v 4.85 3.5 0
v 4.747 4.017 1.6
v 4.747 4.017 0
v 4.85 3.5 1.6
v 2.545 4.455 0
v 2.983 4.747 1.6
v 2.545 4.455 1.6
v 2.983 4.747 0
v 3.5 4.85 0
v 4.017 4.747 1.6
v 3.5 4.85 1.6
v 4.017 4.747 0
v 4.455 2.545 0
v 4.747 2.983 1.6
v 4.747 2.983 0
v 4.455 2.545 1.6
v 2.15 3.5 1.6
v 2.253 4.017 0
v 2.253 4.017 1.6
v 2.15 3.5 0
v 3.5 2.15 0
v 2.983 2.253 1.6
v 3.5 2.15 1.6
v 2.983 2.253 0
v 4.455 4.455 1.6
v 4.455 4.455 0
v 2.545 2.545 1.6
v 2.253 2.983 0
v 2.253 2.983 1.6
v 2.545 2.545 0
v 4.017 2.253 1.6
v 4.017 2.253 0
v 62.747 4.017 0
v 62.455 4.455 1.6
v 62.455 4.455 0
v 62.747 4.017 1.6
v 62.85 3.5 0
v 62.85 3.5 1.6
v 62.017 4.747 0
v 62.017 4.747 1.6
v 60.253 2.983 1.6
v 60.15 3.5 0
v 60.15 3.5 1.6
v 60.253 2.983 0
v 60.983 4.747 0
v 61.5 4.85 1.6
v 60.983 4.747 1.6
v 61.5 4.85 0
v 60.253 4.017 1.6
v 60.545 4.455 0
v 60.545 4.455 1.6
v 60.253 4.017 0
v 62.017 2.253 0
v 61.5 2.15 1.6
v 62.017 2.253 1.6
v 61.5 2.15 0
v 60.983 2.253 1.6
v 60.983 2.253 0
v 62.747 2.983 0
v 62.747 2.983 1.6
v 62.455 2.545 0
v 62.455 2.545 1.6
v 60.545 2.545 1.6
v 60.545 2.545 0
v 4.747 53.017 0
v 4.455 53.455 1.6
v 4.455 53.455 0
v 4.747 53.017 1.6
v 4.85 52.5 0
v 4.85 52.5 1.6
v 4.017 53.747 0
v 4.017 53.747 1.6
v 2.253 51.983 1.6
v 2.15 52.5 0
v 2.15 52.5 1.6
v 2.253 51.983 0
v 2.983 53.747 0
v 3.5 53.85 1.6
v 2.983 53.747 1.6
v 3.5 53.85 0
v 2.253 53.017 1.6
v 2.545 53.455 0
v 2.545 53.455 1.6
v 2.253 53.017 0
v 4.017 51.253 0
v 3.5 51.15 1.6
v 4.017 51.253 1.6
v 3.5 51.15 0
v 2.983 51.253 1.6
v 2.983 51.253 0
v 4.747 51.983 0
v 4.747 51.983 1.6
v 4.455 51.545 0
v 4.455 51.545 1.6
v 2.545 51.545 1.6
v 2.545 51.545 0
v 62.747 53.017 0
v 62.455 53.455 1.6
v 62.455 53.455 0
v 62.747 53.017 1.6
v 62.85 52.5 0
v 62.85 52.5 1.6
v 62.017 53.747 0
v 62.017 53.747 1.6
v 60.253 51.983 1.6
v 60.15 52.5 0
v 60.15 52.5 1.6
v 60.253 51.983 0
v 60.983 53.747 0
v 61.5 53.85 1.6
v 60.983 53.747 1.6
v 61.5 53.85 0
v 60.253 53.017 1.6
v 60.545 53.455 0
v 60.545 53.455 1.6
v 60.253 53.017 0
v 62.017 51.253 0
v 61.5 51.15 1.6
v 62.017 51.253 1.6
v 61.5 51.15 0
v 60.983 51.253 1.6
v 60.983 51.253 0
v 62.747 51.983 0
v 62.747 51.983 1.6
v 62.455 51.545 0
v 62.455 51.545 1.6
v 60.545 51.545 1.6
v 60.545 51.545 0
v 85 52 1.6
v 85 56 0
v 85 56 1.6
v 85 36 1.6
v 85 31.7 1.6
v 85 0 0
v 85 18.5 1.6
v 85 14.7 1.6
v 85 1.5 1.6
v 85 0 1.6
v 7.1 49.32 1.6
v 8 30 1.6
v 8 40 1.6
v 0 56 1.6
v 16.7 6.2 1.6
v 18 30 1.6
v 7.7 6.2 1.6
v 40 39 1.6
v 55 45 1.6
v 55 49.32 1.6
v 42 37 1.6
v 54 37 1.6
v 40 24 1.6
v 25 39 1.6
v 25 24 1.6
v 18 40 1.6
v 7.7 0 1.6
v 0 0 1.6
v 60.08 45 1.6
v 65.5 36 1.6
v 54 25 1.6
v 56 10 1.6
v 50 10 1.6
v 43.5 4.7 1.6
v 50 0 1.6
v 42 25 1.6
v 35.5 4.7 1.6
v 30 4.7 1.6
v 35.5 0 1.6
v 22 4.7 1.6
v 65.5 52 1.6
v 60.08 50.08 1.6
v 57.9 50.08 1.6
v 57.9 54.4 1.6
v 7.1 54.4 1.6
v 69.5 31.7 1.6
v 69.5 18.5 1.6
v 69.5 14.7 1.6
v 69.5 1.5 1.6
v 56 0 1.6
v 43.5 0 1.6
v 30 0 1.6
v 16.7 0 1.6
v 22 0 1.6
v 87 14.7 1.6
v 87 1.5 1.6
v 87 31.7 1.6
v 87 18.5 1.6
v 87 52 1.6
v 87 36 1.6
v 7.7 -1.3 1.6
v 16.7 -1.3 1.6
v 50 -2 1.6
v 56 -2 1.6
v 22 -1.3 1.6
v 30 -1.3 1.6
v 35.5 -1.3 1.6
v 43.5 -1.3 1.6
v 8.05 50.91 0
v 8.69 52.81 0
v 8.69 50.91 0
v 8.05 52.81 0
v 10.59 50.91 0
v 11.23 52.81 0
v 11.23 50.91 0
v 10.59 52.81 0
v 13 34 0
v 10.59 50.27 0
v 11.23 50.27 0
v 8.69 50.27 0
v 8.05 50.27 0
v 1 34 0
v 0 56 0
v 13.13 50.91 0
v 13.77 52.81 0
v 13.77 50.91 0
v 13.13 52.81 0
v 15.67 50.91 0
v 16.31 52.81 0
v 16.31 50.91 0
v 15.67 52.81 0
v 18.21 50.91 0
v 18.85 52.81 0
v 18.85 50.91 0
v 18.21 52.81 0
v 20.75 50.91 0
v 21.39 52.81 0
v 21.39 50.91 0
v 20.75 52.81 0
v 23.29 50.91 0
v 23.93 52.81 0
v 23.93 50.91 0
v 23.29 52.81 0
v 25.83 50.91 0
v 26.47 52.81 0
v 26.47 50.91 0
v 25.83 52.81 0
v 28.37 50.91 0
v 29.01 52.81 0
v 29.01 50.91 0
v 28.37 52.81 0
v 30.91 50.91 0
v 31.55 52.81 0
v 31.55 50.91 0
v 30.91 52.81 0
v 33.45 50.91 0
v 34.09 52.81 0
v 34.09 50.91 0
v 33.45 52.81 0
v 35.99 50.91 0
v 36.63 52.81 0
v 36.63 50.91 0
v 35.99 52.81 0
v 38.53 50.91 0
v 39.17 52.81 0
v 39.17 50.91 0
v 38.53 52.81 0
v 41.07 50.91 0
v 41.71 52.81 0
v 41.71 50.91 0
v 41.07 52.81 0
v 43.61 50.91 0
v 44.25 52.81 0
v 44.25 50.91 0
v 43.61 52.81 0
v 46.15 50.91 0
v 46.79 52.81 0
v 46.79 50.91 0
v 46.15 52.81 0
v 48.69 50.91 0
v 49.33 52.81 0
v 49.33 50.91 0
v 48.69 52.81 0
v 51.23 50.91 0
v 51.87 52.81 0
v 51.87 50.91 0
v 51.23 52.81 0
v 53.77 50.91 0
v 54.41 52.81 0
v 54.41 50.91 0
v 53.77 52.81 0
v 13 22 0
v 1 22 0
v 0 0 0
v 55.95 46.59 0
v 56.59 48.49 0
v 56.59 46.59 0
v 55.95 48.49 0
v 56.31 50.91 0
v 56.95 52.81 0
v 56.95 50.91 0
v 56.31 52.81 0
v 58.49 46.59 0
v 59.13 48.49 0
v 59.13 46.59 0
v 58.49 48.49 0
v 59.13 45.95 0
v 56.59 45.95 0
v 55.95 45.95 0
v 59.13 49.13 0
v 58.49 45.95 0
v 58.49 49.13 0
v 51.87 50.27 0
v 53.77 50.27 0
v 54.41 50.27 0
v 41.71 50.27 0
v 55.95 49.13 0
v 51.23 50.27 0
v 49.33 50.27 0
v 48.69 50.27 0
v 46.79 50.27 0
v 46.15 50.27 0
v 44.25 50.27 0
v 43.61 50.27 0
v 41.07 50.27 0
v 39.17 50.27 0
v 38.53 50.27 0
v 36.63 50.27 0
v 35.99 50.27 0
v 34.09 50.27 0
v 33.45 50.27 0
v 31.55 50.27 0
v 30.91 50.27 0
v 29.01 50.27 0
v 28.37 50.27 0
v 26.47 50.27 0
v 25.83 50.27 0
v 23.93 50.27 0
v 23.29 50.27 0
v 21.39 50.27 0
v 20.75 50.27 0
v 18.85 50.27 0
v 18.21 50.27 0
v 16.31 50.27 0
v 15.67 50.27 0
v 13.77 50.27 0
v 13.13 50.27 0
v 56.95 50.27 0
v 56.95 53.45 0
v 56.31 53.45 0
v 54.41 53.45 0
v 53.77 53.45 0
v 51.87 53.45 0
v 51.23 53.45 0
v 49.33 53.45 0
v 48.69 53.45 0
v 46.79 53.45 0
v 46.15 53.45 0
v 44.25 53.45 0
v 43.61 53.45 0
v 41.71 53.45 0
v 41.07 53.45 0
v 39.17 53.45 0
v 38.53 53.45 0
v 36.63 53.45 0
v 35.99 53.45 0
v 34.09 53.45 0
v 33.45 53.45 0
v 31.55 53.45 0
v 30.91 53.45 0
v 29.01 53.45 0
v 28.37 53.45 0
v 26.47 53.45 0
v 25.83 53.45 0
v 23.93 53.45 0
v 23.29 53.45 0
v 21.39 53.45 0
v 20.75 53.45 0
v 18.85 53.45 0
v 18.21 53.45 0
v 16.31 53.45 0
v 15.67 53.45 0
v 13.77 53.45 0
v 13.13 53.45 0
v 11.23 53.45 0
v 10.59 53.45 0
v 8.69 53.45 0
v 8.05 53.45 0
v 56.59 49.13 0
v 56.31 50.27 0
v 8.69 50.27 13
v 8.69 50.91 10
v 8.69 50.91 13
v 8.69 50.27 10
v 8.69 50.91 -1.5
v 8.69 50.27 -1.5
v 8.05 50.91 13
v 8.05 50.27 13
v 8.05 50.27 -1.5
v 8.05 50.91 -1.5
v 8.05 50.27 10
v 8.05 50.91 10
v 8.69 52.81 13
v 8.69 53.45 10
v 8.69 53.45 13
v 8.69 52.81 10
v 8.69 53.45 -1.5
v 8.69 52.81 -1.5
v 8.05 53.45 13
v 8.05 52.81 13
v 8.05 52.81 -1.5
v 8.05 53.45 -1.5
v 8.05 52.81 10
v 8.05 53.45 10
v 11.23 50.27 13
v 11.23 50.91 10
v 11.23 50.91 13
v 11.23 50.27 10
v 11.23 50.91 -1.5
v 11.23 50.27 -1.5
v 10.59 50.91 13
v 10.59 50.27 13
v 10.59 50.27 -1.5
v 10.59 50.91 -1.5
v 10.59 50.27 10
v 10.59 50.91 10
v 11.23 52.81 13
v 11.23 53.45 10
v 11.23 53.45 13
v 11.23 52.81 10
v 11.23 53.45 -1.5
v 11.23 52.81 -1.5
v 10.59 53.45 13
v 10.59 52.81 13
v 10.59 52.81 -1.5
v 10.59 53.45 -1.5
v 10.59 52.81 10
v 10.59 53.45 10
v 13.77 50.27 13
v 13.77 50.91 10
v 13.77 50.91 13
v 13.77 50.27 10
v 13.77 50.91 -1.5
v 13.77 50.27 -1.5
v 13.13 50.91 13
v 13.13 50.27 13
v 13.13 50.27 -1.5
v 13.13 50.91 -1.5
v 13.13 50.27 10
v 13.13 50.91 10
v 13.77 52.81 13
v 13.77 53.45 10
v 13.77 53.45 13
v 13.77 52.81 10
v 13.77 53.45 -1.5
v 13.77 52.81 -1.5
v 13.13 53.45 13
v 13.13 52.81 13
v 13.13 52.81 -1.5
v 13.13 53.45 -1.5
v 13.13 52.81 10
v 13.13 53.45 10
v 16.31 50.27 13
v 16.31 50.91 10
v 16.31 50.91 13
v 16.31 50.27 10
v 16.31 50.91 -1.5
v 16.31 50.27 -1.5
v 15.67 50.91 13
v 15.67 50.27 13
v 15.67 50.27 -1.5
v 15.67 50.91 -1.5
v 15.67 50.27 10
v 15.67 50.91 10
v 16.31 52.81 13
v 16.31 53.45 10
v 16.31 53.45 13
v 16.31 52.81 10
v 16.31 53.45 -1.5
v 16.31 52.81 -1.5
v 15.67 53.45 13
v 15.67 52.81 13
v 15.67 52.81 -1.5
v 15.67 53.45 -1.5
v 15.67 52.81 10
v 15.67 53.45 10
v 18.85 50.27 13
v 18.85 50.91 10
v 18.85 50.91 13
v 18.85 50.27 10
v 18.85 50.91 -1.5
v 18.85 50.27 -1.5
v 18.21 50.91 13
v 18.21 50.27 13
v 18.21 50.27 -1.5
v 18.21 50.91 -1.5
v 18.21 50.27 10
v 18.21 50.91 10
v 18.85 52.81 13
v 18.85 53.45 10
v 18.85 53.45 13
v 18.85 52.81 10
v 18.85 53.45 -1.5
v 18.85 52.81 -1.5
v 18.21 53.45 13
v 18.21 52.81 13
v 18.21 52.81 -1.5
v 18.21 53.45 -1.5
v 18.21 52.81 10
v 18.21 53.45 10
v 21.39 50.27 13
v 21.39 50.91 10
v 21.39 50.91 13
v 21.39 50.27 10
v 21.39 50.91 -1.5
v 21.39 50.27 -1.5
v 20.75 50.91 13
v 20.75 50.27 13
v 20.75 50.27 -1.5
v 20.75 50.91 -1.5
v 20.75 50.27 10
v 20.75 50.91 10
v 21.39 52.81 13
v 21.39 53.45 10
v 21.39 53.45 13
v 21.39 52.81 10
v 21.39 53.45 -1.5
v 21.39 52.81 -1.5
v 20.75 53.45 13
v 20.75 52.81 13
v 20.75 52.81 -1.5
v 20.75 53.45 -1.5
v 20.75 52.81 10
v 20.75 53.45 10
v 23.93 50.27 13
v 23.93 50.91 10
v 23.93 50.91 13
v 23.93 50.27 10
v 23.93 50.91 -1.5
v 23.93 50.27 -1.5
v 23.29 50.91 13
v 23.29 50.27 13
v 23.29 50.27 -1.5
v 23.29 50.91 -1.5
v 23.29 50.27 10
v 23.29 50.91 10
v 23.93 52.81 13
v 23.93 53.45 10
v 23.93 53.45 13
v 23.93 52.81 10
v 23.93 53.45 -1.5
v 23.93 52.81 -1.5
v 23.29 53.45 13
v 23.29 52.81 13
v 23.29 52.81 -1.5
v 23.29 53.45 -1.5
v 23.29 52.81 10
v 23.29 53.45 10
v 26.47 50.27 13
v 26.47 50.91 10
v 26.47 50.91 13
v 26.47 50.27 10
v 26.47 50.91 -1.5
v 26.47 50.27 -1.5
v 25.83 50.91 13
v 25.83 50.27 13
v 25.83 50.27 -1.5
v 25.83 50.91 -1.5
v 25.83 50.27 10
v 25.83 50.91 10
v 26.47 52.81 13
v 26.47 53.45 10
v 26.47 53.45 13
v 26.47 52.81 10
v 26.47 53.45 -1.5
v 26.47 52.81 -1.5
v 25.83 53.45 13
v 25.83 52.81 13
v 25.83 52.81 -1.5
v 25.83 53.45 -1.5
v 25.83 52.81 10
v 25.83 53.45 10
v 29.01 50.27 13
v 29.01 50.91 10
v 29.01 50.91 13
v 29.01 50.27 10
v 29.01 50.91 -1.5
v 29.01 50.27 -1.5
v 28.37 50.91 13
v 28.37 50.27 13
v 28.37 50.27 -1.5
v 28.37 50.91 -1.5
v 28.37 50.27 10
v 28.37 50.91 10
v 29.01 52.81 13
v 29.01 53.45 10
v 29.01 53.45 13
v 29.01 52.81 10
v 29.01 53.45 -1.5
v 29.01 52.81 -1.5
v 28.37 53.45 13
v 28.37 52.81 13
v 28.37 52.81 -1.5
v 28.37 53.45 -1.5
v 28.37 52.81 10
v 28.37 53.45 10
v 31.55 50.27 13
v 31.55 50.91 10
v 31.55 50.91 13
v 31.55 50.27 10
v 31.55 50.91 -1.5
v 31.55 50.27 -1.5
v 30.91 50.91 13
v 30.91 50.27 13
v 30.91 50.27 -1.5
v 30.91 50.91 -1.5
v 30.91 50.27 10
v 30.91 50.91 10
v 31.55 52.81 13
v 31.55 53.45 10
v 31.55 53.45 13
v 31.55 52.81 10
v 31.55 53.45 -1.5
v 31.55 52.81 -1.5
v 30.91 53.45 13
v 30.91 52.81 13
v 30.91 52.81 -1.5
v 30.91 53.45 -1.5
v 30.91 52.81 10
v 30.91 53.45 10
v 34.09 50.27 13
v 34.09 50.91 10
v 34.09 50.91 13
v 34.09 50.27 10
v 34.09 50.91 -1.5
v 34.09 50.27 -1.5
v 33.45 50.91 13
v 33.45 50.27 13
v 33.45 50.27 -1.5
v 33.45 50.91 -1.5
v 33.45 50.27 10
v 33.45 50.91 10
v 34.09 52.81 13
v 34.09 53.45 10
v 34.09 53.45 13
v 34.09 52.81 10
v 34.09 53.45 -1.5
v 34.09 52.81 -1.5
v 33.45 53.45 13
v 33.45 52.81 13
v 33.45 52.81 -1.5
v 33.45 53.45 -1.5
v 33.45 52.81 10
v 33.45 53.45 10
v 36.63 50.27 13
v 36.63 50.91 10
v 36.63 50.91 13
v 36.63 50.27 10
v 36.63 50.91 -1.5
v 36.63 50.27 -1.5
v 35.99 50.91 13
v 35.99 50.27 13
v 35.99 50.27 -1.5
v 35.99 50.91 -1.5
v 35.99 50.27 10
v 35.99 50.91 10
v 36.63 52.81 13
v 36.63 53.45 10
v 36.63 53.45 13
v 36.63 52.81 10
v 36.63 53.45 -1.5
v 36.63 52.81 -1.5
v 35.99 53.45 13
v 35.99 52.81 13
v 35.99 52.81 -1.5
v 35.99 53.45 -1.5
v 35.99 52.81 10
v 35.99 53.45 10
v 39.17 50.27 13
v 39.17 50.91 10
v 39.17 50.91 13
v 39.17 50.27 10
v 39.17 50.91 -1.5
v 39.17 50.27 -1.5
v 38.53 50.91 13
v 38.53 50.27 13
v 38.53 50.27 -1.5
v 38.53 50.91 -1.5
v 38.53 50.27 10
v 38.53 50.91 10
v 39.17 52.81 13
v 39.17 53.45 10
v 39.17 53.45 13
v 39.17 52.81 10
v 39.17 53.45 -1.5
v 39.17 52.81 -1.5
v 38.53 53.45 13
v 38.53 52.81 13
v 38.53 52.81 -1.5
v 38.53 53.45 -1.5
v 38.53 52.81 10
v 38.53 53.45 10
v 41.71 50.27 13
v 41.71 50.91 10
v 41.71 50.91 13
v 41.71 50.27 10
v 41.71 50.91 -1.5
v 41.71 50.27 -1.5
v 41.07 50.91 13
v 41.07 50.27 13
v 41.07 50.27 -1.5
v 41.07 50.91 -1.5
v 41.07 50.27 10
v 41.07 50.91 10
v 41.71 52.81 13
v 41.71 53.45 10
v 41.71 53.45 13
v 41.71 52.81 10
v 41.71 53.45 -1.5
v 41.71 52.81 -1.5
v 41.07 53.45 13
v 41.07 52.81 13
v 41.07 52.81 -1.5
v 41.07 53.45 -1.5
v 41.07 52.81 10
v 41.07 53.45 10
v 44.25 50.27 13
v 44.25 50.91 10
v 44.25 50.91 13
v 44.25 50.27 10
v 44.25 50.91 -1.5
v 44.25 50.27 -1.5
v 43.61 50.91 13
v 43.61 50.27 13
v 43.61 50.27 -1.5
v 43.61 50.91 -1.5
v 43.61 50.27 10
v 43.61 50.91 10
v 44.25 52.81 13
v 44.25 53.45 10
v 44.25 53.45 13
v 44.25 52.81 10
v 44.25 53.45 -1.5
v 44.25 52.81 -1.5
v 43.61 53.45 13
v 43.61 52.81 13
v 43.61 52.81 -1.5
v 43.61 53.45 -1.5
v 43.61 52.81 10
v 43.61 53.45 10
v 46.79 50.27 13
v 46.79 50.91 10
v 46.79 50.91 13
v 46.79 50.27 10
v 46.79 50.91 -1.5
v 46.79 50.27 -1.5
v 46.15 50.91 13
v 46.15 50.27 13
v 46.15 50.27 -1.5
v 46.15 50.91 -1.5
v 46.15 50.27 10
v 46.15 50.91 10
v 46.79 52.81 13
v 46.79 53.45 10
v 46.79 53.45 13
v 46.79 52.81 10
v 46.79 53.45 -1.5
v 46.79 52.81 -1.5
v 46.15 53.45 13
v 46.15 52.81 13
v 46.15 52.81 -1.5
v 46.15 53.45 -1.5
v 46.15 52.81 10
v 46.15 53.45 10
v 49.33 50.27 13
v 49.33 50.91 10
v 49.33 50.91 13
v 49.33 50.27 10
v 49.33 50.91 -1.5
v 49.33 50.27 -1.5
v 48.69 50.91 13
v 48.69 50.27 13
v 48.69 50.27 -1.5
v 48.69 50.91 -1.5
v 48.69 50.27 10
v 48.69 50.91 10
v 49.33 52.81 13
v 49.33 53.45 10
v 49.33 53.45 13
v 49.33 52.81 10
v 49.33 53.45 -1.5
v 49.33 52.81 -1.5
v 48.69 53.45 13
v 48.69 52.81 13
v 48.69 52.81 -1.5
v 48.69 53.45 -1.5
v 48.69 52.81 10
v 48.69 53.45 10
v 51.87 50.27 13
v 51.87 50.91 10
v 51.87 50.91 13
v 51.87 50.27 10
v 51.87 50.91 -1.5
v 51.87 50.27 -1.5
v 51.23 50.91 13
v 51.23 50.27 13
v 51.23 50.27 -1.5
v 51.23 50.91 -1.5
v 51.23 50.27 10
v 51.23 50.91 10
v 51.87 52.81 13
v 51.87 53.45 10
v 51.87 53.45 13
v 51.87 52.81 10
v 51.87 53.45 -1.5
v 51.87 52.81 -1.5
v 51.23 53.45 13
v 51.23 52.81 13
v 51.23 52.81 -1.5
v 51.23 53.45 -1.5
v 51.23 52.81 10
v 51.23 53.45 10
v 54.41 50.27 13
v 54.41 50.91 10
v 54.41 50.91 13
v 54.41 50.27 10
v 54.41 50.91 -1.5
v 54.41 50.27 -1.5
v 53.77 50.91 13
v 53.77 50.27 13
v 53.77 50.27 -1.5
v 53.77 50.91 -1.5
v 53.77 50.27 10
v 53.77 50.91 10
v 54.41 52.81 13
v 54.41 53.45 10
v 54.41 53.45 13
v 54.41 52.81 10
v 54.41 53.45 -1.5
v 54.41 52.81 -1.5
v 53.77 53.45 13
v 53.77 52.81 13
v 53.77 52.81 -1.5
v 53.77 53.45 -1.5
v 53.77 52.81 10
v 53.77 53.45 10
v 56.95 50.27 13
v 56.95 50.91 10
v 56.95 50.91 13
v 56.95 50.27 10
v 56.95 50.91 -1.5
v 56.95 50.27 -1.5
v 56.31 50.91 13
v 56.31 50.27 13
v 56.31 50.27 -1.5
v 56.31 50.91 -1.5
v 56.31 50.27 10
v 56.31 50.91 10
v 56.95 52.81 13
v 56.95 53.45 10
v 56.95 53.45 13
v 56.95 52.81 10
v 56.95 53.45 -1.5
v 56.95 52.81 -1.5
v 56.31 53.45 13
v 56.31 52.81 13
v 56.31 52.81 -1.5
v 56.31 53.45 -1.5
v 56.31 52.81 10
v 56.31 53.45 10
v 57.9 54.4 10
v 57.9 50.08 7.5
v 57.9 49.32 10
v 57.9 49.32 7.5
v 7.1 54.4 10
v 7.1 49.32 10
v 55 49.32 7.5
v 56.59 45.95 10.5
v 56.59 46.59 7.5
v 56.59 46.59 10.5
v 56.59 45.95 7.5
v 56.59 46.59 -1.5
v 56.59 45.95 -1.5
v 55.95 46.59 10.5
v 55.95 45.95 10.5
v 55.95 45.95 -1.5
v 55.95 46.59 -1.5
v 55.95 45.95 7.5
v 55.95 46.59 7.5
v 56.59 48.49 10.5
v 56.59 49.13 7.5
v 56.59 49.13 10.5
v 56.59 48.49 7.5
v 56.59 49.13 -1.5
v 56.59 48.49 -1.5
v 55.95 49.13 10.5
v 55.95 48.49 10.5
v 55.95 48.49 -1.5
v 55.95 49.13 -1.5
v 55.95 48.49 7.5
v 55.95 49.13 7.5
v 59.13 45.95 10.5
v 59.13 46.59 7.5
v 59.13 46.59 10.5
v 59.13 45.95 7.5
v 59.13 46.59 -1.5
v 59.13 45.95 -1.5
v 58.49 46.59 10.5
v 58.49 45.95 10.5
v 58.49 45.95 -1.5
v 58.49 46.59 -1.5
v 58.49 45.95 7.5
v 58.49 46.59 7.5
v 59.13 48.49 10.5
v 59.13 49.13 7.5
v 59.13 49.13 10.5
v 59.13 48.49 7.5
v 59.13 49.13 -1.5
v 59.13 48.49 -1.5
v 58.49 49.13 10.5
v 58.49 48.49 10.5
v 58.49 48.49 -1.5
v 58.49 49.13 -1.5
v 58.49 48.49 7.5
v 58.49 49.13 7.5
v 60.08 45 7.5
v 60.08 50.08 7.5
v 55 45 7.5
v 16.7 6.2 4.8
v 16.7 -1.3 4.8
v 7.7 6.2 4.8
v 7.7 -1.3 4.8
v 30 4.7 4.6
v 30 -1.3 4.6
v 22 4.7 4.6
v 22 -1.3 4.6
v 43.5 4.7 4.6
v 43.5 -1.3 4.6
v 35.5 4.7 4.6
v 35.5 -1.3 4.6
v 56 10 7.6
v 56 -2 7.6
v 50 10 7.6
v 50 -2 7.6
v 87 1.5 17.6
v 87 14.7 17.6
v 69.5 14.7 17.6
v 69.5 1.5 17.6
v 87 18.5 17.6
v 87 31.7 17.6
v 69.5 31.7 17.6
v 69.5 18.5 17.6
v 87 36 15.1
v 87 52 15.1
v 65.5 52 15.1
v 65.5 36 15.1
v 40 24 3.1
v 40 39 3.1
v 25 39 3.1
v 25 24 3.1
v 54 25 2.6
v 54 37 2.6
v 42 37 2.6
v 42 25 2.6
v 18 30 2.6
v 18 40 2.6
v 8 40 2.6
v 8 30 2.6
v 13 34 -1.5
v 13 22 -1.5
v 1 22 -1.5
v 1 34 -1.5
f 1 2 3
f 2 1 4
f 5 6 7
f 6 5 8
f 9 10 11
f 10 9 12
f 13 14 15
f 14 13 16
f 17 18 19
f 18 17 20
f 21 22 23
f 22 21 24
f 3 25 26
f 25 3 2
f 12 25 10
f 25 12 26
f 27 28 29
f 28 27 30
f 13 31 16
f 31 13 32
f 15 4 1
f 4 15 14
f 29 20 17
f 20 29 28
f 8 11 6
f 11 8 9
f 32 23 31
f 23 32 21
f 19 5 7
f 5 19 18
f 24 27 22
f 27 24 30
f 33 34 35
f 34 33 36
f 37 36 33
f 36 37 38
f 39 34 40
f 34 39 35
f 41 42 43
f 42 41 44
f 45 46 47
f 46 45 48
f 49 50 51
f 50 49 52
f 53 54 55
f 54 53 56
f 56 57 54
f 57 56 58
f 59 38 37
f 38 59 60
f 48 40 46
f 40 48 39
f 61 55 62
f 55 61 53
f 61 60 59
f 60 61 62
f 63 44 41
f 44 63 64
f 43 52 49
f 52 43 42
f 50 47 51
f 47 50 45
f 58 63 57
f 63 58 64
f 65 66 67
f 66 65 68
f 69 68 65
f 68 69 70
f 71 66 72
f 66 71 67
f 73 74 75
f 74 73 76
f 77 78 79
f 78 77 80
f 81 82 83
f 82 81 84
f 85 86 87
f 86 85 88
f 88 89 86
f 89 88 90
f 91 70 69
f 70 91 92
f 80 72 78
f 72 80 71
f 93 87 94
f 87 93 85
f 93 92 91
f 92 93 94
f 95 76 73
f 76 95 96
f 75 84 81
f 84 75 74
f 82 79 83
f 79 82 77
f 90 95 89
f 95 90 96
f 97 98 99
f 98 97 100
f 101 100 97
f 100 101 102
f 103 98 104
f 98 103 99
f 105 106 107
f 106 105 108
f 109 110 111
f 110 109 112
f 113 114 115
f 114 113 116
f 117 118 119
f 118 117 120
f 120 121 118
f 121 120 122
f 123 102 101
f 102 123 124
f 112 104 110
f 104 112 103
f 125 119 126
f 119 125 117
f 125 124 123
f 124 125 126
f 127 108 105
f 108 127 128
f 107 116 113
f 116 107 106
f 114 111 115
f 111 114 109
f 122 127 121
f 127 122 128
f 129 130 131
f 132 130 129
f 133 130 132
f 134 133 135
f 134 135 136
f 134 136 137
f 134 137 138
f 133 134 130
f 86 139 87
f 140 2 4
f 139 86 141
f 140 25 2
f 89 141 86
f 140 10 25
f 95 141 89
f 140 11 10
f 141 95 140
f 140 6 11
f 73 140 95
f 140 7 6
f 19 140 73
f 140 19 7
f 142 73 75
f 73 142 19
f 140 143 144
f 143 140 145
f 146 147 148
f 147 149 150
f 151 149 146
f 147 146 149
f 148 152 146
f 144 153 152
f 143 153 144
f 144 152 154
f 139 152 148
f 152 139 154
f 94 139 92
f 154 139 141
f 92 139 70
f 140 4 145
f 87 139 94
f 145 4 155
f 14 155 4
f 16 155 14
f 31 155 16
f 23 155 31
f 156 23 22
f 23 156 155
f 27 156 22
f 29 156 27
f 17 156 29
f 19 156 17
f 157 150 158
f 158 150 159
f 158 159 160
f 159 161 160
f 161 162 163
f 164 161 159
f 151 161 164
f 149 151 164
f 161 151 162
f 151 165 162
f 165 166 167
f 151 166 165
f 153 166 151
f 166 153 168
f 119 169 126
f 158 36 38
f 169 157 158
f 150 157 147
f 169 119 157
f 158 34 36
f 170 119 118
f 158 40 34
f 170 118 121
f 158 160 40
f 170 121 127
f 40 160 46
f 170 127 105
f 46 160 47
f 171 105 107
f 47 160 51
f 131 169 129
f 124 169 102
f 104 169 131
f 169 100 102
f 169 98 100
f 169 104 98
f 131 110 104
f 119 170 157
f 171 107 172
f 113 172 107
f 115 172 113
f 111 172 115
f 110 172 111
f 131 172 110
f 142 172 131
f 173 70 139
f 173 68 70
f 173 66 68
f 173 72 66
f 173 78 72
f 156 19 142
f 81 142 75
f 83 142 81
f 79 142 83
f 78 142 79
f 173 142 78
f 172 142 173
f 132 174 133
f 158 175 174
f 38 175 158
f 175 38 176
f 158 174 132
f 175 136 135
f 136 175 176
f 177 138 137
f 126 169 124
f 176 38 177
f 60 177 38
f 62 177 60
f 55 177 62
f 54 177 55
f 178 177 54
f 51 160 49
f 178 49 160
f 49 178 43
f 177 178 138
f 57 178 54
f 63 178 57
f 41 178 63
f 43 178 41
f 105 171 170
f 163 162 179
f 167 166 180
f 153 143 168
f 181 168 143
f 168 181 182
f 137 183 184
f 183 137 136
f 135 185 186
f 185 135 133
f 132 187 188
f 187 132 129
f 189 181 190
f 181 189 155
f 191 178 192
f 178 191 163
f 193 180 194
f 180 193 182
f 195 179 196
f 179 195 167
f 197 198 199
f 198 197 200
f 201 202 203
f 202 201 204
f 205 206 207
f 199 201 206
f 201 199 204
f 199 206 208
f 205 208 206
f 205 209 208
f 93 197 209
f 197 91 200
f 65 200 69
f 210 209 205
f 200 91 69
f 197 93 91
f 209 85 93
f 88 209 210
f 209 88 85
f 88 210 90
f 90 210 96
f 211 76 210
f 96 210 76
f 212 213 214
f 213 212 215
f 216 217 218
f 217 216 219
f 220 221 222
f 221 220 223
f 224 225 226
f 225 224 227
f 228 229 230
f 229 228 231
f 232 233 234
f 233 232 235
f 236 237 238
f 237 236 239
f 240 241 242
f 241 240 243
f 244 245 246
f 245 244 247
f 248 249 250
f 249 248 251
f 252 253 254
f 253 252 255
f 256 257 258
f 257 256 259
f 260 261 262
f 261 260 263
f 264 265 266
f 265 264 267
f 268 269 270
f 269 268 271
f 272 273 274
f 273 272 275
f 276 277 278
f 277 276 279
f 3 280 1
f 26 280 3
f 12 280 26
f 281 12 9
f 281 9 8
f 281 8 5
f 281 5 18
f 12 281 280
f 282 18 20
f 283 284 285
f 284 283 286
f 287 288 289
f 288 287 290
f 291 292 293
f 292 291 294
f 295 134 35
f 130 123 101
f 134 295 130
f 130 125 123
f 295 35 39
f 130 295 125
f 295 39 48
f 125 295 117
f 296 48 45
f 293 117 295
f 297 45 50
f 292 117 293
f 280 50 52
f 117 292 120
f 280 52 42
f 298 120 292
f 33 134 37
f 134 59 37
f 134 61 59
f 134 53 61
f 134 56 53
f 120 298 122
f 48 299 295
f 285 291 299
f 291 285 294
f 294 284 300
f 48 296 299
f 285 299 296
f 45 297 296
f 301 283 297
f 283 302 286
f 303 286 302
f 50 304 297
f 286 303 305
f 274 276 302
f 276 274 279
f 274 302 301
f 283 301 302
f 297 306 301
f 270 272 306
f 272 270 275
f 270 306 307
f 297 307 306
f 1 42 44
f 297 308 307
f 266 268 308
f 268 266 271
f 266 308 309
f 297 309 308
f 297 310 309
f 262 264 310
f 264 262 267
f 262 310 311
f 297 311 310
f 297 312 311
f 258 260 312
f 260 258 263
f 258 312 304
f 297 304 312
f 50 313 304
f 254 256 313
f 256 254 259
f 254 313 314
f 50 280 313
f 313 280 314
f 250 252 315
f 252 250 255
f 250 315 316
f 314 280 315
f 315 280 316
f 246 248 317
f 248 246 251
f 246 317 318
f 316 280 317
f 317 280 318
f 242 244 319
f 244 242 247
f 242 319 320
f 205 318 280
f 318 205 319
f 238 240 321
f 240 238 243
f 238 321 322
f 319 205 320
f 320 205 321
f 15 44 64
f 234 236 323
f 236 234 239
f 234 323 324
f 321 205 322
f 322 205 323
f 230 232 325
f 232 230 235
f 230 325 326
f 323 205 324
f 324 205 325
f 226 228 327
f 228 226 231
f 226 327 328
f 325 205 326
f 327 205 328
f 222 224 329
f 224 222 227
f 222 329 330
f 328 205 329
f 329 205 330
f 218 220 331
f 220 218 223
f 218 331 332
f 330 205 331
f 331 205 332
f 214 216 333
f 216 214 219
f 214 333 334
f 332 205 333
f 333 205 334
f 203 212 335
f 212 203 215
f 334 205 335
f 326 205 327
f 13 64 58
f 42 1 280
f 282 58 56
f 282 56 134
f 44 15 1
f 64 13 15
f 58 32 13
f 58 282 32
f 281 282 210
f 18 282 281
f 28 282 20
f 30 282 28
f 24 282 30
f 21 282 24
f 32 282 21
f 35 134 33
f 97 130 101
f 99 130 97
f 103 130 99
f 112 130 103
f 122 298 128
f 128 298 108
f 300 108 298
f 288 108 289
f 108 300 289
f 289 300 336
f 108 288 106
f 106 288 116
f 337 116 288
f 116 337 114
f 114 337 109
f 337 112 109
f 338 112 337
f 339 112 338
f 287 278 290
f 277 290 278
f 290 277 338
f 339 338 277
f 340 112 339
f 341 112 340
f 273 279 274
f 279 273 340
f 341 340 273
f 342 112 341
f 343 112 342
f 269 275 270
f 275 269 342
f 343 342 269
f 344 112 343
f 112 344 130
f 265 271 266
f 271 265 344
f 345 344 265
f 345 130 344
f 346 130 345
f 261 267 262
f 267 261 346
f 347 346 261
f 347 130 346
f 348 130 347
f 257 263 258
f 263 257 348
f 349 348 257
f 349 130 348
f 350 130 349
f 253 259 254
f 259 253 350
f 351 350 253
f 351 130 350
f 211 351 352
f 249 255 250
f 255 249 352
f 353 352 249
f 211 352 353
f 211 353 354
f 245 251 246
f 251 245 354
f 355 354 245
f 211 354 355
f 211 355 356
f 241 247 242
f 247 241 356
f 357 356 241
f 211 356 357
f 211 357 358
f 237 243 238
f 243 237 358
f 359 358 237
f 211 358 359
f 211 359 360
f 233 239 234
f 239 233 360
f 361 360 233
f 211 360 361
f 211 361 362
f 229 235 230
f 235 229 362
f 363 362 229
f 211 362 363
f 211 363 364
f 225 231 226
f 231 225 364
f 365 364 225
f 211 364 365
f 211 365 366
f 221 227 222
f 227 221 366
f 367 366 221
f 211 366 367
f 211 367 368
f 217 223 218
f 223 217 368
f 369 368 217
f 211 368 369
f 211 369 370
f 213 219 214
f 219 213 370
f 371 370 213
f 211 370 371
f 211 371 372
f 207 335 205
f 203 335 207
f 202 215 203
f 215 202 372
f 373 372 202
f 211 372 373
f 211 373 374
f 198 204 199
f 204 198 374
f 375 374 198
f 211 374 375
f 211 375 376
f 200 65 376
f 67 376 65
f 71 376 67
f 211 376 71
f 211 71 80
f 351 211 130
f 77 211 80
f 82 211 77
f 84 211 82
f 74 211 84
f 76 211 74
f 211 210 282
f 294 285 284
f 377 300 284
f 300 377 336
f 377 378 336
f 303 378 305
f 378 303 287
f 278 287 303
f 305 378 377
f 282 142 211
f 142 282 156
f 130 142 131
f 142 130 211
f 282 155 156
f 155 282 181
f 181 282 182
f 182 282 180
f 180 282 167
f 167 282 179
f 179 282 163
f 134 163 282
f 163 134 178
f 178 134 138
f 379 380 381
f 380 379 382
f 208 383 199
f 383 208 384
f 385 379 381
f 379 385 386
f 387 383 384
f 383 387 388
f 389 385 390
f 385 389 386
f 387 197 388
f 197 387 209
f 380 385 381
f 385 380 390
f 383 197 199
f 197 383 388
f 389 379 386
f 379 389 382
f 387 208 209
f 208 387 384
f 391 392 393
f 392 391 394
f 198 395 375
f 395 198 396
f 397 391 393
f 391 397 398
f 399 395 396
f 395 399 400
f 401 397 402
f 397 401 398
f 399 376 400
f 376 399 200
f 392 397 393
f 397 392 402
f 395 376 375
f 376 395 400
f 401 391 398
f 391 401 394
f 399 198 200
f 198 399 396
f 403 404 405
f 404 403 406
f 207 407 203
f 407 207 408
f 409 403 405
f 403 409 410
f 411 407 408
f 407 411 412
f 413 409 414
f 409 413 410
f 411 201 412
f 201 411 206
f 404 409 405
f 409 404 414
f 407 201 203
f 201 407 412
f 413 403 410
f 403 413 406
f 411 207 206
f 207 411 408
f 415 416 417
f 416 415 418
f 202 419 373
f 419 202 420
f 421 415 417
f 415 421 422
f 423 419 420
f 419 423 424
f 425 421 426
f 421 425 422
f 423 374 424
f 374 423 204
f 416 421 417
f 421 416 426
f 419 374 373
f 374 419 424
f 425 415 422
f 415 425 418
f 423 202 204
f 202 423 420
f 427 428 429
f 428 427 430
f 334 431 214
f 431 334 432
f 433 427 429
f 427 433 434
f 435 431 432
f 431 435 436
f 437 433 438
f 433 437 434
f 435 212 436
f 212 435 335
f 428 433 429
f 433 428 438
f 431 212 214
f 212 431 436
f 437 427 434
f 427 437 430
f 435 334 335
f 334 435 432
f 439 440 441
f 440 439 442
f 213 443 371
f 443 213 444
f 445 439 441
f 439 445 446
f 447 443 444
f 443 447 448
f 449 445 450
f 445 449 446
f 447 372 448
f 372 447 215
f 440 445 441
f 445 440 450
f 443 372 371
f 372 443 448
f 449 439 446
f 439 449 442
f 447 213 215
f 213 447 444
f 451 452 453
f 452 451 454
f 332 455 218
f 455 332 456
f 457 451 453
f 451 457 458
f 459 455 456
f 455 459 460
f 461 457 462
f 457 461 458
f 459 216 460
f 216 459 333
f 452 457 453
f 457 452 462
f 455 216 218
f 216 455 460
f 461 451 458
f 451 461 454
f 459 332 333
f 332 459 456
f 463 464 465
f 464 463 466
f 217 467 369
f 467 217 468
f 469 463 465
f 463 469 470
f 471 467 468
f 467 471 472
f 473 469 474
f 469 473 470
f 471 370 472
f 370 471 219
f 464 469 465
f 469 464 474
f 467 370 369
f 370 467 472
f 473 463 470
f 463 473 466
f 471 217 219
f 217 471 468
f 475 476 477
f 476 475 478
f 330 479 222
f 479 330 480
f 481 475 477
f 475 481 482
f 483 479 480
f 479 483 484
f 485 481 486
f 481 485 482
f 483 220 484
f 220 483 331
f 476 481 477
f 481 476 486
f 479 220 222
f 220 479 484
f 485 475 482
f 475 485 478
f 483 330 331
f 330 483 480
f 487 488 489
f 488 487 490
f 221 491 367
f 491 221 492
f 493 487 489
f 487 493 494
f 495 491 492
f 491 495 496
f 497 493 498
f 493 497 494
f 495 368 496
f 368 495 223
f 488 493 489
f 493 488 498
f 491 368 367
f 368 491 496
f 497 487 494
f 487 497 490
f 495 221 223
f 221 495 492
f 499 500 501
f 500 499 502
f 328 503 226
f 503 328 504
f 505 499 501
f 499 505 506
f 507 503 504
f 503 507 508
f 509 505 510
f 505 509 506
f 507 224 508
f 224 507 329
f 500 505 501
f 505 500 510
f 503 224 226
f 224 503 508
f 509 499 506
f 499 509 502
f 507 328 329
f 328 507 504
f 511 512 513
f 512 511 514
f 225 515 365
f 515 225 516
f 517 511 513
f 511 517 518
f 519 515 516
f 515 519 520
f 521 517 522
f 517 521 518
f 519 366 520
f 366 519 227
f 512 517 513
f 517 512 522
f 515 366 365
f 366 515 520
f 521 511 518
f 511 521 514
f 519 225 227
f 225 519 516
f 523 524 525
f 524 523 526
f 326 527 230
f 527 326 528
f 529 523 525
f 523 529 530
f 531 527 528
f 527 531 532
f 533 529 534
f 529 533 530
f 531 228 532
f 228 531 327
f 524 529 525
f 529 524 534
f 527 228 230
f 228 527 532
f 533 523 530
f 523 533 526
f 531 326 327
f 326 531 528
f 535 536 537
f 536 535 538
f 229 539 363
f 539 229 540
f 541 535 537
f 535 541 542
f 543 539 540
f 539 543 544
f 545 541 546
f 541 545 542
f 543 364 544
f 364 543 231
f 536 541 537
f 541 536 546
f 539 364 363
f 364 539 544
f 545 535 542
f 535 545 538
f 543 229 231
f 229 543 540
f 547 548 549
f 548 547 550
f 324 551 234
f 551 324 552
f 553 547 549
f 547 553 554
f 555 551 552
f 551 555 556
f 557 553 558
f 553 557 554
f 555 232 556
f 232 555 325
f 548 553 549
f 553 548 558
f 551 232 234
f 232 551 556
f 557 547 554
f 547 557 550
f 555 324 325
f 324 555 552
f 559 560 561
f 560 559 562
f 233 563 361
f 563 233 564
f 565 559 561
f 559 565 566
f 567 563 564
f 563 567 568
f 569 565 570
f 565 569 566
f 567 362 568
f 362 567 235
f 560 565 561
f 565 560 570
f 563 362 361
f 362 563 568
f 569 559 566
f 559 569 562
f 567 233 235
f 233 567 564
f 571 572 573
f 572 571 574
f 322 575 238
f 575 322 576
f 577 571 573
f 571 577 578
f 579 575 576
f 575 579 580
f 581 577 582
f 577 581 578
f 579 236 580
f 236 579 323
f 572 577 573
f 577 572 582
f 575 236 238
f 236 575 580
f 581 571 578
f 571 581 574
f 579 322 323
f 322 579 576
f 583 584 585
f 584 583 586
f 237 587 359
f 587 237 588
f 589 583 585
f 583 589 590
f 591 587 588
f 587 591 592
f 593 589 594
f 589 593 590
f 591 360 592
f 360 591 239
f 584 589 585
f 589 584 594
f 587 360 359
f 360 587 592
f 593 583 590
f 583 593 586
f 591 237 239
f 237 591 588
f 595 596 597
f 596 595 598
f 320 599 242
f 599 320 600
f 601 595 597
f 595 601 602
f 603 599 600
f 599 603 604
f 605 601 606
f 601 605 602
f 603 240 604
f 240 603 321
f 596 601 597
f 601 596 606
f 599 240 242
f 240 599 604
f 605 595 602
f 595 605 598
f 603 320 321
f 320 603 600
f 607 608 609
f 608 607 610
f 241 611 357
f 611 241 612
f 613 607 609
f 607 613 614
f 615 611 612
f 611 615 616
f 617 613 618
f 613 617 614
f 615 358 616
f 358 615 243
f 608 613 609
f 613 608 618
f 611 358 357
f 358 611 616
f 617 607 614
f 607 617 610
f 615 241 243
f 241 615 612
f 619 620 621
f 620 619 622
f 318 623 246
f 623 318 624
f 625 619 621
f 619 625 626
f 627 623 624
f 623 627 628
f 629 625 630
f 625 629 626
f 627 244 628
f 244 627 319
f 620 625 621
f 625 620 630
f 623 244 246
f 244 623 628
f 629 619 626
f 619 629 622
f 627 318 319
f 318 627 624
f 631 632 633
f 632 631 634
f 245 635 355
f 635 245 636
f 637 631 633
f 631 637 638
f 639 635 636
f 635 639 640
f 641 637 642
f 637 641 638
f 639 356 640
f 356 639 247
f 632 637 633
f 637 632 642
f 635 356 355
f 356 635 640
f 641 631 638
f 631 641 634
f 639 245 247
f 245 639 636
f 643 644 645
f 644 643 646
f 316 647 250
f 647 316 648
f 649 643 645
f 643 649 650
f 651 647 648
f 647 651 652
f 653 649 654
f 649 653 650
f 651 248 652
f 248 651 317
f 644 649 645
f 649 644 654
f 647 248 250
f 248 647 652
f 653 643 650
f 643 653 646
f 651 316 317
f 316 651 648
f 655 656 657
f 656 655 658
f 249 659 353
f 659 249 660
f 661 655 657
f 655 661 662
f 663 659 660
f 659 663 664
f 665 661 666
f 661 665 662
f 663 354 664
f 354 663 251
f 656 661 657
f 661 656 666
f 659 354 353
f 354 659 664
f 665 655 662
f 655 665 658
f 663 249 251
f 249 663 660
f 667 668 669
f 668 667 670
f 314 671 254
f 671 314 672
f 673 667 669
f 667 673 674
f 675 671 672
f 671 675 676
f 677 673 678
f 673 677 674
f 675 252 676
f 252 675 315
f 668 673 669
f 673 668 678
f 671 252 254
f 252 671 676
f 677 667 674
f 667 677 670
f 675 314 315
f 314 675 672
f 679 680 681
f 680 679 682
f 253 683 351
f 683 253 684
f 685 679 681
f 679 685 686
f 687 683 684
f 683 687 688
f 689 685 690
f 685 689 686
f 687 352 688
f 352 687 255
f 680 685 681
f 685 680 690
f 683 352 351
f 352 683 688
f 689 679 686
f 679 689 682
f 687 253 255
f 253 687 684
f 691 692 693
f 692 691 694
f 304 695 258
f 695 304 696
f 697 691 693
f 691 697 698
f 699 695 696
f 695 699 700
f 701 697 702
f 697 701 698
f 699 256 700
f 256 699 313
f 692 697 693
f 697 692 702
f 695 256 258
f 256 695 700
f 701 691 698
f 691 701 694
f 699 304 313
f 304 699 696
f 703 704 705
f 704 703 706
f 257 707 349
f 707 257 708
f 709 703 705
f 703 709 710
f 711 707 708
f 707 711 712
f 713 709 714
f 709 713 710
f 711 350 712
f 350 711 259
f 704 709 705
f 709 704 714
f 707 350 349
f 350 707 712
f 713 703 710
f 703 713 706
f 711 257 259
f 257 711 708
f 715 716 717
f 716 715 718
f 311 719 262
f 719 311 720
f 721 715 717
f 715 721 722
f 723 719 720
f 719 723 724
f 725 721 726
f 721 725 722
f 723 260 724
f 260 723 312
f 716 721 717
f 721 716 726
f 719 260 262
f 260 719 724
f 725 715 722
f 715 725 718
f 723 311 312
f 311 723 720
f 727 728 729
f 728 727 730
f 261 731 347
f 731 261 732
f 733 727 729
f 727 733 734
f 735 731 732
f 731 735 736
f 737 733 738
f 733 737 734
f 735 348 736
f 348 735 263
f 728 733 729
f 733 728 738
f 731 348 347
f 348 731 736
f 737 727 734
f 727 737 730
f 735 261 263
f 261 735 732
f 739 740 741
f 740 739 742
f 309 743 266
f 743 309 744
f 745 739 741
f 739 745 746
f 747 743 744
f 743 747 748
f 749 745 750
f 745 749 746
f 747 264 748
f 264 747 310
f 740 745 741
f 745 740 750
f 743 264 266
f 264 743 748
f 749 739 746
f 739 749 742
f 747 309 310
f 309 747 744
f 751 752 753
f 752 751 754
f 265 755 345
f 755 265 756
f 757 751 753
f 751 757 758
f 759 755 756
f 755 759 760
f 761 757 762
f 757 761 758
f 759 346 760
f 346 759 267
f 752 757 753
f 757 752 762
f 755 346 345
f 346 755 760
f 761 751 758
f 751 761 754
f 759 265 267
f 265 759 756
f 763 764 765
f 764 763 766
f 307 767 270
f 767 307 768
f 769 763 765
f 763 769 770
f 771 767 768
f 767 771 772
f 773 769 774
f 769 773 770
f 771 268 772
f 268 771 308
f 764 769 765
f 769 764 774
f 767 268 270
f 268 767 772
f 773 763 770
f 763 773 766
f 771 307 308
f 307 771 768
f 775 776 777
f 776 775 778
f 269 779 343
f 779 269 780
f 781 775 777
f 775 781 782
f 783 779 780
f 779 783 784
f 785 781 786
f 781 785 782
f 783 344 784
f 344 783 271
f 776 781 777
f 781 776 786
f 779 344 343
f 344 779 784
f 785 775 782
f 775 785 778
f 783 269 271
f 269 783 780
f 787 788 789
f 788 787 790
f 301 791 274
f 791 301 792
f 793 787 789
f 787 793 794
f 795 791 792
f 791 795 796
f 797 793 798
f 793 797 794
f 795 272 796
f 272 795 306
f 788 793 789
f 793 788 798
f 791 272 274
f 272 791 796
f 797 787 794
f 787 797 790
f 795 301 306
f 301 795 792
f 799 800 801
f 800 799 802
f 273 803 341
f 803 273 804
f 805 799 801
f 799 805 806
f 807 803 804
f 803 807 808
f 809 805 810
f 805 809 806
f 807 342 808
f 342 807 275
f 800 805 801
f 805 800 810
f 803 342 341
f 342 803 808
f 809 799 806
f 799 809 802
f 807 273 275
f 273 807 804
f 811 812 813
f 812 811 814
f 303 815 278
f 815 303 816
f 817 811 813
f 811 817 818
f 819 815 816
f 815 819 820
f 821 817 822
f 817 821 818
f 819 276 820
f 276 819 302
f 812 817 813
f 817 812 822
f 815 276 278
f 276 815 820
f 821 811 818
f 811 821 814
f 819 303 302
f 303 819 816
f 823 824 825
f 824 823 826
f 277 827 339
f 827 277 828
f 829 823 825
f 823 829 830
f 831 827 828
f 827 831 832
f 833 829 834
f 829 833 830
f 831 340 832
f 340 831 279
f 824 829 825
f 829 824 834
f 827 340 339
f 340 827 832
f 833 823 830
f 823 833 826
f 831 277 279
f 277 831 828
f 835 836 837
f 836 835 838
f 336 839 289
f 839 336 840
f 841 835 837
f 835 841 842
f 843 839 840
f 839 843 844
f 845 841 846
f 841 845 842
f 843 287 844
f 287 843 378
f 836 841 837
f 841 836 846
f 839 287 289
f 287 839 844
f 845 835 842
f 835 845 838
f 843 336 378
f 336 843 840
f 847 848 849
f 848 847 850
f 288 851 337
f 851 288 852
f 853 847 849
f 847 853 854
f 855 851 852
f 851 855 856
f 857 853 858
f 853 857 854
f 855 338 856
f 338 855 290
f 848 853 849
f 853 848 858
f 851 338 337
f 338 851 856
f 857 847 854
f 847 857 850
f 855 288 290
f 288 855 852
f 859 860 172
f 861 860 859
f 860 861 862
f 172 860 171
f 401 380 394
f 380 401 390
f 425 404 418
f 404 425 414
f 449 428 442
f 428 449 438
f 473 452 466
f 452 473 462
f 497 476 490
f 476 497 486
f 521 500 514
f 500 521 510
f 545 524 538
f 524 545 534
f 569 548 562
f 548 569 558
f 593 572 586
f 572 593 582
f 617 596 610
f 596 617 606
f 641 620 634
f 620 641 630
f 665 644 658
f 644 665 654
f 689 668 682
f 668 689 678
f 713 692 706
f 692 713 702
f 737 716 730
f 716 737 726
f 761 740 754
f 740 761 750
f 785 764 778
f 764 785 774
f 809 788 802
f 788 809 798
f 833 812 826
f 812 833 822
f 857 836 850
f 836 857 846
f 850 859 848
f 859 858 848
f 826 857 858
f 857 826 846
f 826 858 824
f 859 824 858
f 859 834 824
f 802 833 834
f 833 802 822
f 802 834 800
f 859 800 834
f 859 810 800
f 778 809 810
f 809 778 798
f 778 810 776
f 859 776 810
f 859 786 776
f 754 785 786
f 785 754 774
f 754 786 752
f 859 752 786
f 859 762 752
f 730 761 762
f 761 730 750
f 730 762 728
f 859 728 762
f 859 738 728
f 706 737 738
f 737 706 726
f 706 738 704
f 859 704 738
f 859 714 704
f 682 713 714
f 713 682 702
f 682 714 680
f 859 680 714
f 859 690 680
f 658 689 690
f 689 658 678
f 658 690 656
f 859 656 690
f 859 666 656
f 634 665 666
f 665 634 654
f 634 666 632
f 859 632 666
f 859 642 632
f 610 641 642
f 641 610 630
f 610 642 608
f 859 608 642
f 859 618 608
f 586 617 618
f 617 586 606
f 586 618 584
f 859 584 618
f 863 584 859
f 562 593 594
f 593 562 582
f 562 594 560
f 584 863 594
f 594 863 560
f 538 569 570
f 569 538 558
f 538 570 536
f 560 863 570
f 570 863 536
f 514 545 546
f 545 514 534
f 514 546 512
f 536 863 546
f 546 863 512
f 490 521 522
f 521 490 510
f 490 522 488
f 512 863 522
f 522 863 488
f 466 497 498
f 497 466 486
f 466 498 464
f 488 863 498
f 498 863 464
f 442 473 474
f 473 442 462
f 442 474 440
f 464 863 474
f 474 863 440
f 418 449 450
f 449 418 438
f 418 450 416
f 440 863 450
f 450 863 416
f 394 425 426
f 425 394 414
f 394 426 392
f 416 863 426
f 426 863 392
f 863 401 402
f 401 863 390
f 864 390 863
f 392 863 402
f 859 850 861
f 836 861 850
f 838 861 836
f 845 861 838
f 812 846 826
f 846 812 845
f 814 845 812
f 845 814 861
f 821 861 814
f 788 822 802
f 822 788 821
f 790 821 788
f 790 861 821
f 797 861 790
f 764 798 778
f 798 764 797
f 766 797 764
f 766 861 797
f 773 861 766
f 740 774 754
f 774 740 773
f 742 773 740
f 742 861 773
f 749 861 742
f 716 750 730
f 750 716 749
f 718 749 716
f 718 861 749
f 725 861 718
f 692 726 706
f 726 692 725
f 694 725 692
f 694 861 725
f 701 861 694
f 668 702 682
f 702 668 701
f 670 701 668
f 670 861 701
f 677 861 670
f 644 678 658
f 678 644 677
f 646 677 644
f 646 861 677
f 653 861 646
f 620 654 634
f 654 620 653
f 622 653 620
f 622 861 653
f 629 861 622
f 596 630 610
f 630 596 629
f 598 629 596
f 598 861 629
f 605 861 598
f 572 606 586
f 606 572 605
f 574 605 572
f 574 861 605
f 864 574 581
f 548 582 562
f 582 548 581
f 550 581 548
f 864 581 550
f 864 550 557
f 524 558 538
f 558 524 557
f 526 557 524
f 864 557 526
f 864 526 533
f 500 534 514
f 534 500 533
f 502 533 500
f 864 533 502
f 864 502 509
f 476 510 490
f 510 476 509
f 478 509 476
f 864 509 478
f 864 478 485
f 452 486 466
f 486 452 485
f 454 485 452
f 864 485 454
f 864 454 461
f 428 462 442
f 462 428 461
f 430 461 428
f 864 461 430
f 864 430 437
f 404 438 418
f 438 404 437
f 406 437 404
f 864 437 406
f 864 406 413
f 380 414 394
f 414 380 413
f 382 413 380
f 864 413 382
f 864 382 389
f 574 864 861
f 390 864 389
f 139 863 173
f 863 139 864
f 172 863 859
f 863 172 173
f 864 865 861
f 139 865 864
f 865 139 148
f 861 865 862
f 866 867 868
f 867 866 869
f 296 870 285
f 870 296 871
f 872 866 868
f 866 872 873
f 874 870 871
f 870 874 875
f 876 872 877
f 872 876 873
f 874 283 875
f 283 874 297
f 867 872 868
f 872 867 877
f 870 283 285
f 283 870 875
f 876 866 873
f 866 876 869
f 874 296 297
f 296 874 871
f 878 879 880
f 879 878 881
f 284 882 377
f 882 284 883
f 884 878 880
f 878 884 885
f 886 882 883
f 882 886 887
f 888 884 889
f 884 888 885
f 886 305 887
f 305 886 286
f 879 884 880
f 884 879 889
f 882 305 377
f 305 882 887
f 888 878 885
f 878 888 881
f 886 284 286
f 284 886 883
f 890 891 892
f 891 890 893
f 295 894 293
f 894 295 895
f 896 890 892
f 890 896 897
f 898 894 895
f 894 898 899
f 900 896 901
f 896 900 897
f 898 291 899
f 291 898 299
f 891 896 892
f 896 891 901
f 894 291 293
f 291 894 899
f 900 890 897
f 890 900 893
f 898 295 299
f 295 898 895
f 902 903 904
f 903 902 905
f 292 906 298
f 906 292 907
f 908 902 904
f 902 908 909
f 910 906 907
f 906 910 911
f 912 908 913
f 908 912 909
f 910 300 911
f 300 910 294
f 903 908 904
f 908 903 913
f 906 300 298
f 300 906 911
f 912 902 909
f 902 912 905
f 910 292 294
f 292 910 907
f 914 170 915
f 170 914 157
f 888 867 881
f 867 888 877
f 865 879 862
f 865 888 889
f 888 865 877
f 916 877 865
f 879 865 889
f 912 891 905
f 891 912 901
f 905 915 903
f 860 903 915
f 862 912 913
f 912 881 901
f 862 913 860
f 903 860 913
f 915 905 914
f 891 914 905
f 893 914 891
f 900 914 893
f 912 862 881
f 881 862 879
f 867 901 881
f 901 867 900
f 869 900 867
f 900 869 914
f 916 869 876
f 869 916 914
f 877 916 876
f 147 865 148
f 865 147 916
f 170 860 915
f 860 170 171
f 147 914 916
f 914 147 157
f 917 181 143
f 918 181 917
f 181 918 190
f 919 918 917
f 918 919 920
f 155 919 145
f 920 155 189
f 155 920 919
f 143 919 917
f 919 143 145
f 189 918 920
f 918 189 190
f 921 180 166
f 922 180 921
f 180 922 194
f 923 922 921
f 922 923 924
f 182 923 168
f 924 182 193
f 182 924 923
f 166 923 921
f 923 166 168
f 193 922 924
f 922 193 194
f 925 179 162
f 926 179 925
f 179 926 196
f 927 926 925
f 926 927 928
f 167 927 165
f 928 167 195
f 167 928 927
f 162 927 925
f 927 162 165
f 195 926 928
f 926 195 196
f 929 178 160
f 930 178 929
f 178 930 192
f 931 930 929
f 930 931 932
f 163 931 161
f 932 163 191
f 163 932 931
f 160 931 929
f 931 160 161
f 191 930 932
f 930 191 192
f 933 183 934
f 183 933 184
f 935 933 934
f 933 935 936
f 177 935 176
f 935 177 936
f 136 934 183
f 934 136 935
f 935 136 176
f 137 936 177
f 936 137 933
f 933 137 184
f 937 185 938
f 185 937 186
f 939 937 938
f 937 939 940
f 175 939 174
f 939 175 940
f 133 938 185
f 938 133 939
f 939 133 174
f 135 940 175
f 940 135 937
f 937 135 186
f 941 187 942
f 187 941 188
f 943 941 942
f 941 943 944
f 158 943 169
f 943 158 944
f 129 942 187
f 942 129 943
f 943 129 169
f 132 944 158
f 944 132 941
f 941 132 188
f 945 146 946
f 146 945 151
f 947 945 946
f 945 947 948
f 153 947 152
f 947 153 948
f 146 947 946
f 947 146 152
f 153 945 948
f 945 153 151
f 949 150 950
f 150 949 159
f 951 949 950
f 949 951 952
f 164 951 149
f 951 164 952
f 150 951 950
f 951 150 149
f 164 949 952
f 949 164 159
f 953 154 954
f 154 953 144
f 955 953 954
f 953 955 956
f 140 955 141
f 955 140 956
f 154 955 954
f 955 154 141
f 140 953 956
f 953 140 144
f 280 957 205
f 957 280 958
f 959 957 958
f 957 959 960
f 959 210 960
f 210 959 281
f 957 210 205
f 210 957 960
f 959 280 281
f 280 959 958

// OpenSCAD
// file: ../board_common.scad
// What every board model here is made of: a PCB with holes, pin headers,
// chips and jacks, drawn from published dimensions. Nothing here is anyone's
// mesh; a board's outline, hole positions and connector placements are
// specifications the makers publish so that cases and shields can be made.
//
// Every board's origin is its PCB's front-left bottom corner (x right, y back,
// z up), with the PCB lying flat on z = 0 -- so a board placed at a node in
// a site sits on that node's floor, which is where a board sits on a bench.

pcb_t = 1.6;
pitch = 2.54;

module pcb(size, holes = [], hole_d = 3.2, col = "darkgreen") {
    color(col) difference() {
        cube([size.x, size.y, pcb_t]);
        for (h = holes) translate([h.x, h.y, -1]) cylinder(d = hole_d, h = pcb_t + 2, $fn = 16);
    }
}

// Pins are square posts that overlap what they stand in. OpenSCAD 2021.01
// exports a union with hexagonal pins, or with parts that only touch along
// an edge, as a mesh that is not closed -- and then drops it from any later
// union, silently. Every part here overlaps its neighbour by a little.
pin = 0.64;

// a row of `n` pins at the given start, along +x (or +y when `along_y`), with plastic bodies
module header(n, at, along_y = false, rows = 1, h = 8.5) {
    translate([at.x, at.y, pcb_t - 0.1]) rotate([0, 0, along_y ? 90 : 0]) translate([0, along_y ? -rows * pitch : 0, 0]) {
        color("black") cube([n * pitch, rows * pitch, h]);
        color("gold") for (i = [0 : n - 1]) for (r = [0 : rows - 1])
            translate([i * pitch + pitch / 2 - pin / 2, r * pitch + pitch / 2 - pin / 2, -3]) cube([pin, pin, h + 6]);
    }
}

// a row of `n` bare pins pointing down (a devkit standing on a breadboard).
// The pins are one gold strip, not n posts: n posts through a plastic bar
// under a PCB is a face with n holes, which OpenSCAD 2021.01 exports as a
// mesh CGAL will not read back. At bench scale a strip is a row of pins.
module pins_down(n, at, along_y = false, len = 11) {
    // one translate per solid, from the board's own frame: a chain of
    // translates with negative offsets rounds differently and the exporter
    // then writes a mesh CGAL will not read back (seen; not understood)
    rotate([0, 0, along_y ? 90 : 0]) {
        color("black") translate([at.x, at.y - pitch / 2, pcb_t - pitch]) cube([n * pitch, pitch, pitch + 0.1]);
        color("gold") translate([at.x + pitch / 2 - pin / 2, at.y - pin / 2, -len]) cube([(n - 1) * pitch + pin, pin, len + pcb_t - pitch + 0.2]);
    }
}

module chip(size, at, col = "black") { color(col) translate([at.x, at.y, pcb_t - 0.1]) cube([size.x, size.y, size.z + 0.1]); }

module usb_b(at) {           // a full-size USB-B jack, its face at the -x side
    color("silver") translate([at.x, at.y, pcb_t]) cube([16, 12, 11]);
}
module barrel_jack(at) {     // a 2.1 mm DC jack, its face at the -x side
    color("black") translate([at.x, at.y, pcb_t]) cube([14, 9, 11]);
}
module micro_usb(at, along_y = false) {
    color("silver") translate([at.x, at.y, pcb_t]) cube(along_y ? [8, 6, 3] : [6, 8, 3]);
}
module usb_c(at) { color("silver") translate([at.x, at.y, pcb_t]) cube([9, 7.5, 3.2]); }
module usb_a_stack(at) {     // two USB-A ports one above the other, the face at +x
    color("silver") translate([at.x, at.y, pcb_t]) cube([17.5, 13.2, 16]);
}
module rj45(at) { color("silver") translate([at.x, at.y, pcb_t]) cube([21.5, 16, 13.5]); }
module button(at) { color("silver") translate([at.x, at.y, pcb_t - 0.1]) cube([6, 6, 3.6]); color("black") translate([at.x + 1.5, at.y + 1.5, pcb_t + 3.4]) cube([3, 3, 1.1]); }
module crystal(at) { color("silver") translate([at.x, at.y, pcb_t]) cube([11, 4.5, 3.5]); }
module heatsink(at, size = [9, 9, 8]) { color("black") translate([at.x, at.y, pcb_t - 0.1]) cube([size.x, size.y, size.z + 4.1]); }
module screw_terminal(n, at, along_y = false) {
    translate([at.x, at.y, pcb_t]) rotate([0, 0, along_y ? 90 : 0]) color("mediumblue") cube([n * 5.08, 8, 10]);
}
module jst(n, at, along_y = false) {   // a JST-XH style header
    translate([at.x, at.y, pcb_t]) rotate([0, 0, along_y ? 90 : 0]) color("ivory") cube([n * 2.5 + 2.4, 5.8, 7]);
}
module sd_slot(at) { color("silver") translate([at.x, at.y, pcb_t]) cube([26, 28, 3]); }
// main file
// Raspberry Pi 4 Model B, from the published mechanical drawing: an 85 x 56 mm
// PCB with four M2.5 holes 3.5 mm in from the edges, the 40-pin GPIO header
// along the back edge, USB-C power, two micro-HDMI and the audio jack along
// the front edge, the two USB stacks and the Ethernet jack on the right edge,
// the SoC in the middle.

include <../board_common.scad>

size = [85, 56];
holes = [[3.5, 3.5], [61.5, 3.5], [3.5, 52.5], [61.5, 52.5]];

module raspberry_pi_4() {
    pcb(size, holes, hole_d = 2.7);
    header(20, [7.1, 56 - 2 * pitch - 1.6], rows = 2);   // GPIO, 2 x 20
    usb_c([7.7, -1.3]);
    micro_usb([22, -1.3], along_y = true);
    micro_usb([35.5, -1.3], along_y = true);
    color("black") translate([50, -2, pcb_t]) cube([6, 12, 6]);        // the audio jack
    usb_a_stack([85 - 17.5 + 2, 1.5]);                                   // USB 2.0, overhanging 2
    usb_a_stack([85 - 17.5 + 2, 18.5]);                                  // USB 3.0
    rj45([85 - 21.5 + 2, 36]);
    chip([15, 15, 1.5], [25, 24], "silver");                             // the BCM2711
    chip([12, 12, 1], [42, 25]);                                         // the RAM
    chip([10, 10, 1], [8, 30], "silver");                                // the wireless module
    header(2, [55, 45], rows = 2, h = 6);                                // PoE
    color("silver") translate([1, 22, -1.5]) cube([12, 12, 1.5]);        // the SD slot, underneath
}

raspberry_pi_4();
